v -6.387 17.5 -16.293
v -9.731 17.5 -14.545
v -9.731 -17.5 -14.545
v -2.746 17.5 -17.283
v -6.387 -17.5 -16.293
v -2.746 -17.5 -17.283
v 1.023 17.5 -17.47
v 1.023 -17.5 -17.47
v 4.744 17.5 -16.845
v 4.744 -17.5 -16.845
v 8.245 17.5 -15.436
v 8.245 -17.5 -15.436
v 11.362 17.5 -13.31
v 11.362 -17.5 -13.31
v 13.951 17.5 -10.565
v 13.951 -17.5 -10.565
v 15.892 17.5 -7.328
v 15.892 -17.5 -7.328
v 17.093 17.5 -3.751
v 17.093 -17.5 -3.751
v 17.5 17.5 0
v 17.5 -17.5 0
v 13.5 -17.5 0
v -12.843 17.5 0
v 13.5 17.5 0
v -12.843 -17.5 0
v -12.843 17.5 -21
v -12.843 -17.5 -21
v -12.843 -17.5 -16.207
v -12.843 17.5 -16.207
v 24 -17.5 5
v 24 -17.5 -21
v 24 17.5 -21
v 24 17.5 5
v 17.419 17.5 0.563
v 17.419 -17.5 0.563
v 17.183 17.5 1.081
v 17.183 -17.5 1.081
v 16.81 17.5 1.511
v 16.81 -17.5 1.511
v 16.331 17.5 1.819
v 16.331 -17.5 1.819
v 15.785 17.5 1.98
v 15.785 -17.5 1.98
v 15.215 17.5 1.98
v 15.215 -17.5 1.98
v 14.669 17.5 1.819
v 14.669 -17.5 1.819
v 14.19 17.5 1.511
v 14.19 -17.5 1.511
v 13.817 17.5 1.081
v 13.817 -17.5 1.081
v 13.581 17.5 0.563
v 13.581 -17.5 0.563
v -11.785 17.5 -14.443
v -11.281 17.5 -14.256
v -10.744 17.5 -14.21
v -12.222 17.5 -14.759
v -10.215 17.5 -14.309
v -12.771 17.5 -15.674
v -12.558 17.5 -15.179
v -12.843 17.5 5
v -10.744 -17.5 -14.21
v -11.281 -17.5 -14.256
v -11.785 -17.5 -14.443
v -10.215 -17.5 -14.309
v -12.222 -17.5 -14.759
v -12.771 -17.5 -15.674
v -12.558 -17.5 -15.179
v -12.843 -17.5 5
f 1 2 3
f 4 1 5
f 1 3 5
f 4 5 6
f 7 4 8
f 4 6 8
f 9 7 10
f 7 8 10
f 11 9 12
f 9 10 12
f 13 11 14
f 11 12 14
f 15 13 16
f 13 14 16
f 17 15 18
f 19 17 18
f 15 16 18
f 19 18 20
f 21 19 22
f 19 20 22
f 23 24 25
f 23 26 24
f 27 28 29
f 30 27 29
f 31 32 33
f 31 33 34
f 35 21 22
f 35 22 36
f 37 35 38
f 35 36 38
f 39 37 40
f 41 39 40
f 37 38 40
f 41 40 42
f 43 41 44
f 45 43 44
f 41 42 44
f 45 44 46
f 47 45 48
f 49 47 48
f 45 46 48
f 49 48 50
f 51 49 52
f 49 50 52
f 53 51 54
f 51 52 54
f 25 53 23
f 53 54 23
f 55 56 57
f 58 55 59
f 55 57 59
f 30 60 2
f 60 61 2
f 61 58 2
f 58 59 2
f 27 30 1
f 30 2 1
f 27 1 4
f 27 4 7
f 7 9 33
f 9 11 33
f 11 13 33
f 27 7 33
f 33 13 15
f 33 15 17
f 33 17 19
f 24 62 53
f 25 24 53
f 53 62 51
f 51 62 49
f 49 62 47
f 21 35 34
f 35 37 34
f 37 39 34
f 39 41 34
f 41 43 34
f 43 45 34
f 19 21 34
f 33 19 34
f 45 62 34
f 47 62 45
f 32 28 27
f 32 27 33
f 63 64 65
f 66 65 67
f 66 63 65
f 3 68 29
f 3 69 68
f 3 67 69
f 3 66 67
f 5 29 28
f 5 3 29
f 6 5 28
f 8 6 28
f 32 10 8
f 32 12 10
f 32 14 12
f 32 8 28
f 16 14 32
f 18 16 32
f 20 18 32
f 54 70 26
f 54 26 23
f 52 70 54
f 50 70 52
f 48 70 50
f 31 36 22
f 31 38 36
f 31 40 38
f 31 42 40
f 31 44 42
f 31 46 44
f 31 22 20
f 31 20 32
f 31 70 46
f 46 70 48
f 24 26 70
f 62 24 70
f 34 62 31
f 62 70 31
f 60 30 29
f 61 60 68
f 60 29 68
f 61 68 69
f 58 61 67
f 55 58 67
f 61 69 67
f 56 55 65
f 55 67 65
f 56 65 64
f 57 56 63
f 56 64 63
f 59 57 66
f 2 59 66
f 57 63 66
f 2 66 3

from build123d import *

# Parameters (mm, degrees)
PAD_DEPTH    = 50
SKETCH002_W  = 36.843056
SKETCH002_H  = 26
PAD003_DEPTH = 17.5
FILLET_R     = 2


with BuildPart() as pad:
    # Sketch → Pad (new body, symmetric)
    with BuildSketch(Plane.XZ):
        with BuildLine():
            Line((-13.5, 0), (13.5, 0))
            ThreePointArc((17.5, 0), (15.5, 2), (13.5, 0))
            ThreePointArc((-17.5, 0), (0, -17.5), (17.5, 0))
            ThreePointArc((-13.5, 0), (-15.5, 2), (-17.5, 0))
        make_face()
    extrude(amount=PAD_DEPTH, both=True)


with BuildPart() as fillet_body:
    # Sketch002 → Pad003 (new body, symmetric)
    with BuildSketch(Plane.XZ):
        with Locations((5.578472, -8)):
            Rectangle(SKETCH002_W, SKETCH002_H)
    extrude(amount=PAD003_DEPTH, both=True)

    # Cut: cut Pad
    add(pad.part, mode=Mode.SUBTRACT)

    # Fillet
    fillet_edges = [fillet_body.edges().sort_by_distance(p)[0] for p in [
        (-12.843056, 0, -11.887216),
    ]]
    fillet(fillet_edges, radius=FILLET_R)


solid = fillet_body.part
